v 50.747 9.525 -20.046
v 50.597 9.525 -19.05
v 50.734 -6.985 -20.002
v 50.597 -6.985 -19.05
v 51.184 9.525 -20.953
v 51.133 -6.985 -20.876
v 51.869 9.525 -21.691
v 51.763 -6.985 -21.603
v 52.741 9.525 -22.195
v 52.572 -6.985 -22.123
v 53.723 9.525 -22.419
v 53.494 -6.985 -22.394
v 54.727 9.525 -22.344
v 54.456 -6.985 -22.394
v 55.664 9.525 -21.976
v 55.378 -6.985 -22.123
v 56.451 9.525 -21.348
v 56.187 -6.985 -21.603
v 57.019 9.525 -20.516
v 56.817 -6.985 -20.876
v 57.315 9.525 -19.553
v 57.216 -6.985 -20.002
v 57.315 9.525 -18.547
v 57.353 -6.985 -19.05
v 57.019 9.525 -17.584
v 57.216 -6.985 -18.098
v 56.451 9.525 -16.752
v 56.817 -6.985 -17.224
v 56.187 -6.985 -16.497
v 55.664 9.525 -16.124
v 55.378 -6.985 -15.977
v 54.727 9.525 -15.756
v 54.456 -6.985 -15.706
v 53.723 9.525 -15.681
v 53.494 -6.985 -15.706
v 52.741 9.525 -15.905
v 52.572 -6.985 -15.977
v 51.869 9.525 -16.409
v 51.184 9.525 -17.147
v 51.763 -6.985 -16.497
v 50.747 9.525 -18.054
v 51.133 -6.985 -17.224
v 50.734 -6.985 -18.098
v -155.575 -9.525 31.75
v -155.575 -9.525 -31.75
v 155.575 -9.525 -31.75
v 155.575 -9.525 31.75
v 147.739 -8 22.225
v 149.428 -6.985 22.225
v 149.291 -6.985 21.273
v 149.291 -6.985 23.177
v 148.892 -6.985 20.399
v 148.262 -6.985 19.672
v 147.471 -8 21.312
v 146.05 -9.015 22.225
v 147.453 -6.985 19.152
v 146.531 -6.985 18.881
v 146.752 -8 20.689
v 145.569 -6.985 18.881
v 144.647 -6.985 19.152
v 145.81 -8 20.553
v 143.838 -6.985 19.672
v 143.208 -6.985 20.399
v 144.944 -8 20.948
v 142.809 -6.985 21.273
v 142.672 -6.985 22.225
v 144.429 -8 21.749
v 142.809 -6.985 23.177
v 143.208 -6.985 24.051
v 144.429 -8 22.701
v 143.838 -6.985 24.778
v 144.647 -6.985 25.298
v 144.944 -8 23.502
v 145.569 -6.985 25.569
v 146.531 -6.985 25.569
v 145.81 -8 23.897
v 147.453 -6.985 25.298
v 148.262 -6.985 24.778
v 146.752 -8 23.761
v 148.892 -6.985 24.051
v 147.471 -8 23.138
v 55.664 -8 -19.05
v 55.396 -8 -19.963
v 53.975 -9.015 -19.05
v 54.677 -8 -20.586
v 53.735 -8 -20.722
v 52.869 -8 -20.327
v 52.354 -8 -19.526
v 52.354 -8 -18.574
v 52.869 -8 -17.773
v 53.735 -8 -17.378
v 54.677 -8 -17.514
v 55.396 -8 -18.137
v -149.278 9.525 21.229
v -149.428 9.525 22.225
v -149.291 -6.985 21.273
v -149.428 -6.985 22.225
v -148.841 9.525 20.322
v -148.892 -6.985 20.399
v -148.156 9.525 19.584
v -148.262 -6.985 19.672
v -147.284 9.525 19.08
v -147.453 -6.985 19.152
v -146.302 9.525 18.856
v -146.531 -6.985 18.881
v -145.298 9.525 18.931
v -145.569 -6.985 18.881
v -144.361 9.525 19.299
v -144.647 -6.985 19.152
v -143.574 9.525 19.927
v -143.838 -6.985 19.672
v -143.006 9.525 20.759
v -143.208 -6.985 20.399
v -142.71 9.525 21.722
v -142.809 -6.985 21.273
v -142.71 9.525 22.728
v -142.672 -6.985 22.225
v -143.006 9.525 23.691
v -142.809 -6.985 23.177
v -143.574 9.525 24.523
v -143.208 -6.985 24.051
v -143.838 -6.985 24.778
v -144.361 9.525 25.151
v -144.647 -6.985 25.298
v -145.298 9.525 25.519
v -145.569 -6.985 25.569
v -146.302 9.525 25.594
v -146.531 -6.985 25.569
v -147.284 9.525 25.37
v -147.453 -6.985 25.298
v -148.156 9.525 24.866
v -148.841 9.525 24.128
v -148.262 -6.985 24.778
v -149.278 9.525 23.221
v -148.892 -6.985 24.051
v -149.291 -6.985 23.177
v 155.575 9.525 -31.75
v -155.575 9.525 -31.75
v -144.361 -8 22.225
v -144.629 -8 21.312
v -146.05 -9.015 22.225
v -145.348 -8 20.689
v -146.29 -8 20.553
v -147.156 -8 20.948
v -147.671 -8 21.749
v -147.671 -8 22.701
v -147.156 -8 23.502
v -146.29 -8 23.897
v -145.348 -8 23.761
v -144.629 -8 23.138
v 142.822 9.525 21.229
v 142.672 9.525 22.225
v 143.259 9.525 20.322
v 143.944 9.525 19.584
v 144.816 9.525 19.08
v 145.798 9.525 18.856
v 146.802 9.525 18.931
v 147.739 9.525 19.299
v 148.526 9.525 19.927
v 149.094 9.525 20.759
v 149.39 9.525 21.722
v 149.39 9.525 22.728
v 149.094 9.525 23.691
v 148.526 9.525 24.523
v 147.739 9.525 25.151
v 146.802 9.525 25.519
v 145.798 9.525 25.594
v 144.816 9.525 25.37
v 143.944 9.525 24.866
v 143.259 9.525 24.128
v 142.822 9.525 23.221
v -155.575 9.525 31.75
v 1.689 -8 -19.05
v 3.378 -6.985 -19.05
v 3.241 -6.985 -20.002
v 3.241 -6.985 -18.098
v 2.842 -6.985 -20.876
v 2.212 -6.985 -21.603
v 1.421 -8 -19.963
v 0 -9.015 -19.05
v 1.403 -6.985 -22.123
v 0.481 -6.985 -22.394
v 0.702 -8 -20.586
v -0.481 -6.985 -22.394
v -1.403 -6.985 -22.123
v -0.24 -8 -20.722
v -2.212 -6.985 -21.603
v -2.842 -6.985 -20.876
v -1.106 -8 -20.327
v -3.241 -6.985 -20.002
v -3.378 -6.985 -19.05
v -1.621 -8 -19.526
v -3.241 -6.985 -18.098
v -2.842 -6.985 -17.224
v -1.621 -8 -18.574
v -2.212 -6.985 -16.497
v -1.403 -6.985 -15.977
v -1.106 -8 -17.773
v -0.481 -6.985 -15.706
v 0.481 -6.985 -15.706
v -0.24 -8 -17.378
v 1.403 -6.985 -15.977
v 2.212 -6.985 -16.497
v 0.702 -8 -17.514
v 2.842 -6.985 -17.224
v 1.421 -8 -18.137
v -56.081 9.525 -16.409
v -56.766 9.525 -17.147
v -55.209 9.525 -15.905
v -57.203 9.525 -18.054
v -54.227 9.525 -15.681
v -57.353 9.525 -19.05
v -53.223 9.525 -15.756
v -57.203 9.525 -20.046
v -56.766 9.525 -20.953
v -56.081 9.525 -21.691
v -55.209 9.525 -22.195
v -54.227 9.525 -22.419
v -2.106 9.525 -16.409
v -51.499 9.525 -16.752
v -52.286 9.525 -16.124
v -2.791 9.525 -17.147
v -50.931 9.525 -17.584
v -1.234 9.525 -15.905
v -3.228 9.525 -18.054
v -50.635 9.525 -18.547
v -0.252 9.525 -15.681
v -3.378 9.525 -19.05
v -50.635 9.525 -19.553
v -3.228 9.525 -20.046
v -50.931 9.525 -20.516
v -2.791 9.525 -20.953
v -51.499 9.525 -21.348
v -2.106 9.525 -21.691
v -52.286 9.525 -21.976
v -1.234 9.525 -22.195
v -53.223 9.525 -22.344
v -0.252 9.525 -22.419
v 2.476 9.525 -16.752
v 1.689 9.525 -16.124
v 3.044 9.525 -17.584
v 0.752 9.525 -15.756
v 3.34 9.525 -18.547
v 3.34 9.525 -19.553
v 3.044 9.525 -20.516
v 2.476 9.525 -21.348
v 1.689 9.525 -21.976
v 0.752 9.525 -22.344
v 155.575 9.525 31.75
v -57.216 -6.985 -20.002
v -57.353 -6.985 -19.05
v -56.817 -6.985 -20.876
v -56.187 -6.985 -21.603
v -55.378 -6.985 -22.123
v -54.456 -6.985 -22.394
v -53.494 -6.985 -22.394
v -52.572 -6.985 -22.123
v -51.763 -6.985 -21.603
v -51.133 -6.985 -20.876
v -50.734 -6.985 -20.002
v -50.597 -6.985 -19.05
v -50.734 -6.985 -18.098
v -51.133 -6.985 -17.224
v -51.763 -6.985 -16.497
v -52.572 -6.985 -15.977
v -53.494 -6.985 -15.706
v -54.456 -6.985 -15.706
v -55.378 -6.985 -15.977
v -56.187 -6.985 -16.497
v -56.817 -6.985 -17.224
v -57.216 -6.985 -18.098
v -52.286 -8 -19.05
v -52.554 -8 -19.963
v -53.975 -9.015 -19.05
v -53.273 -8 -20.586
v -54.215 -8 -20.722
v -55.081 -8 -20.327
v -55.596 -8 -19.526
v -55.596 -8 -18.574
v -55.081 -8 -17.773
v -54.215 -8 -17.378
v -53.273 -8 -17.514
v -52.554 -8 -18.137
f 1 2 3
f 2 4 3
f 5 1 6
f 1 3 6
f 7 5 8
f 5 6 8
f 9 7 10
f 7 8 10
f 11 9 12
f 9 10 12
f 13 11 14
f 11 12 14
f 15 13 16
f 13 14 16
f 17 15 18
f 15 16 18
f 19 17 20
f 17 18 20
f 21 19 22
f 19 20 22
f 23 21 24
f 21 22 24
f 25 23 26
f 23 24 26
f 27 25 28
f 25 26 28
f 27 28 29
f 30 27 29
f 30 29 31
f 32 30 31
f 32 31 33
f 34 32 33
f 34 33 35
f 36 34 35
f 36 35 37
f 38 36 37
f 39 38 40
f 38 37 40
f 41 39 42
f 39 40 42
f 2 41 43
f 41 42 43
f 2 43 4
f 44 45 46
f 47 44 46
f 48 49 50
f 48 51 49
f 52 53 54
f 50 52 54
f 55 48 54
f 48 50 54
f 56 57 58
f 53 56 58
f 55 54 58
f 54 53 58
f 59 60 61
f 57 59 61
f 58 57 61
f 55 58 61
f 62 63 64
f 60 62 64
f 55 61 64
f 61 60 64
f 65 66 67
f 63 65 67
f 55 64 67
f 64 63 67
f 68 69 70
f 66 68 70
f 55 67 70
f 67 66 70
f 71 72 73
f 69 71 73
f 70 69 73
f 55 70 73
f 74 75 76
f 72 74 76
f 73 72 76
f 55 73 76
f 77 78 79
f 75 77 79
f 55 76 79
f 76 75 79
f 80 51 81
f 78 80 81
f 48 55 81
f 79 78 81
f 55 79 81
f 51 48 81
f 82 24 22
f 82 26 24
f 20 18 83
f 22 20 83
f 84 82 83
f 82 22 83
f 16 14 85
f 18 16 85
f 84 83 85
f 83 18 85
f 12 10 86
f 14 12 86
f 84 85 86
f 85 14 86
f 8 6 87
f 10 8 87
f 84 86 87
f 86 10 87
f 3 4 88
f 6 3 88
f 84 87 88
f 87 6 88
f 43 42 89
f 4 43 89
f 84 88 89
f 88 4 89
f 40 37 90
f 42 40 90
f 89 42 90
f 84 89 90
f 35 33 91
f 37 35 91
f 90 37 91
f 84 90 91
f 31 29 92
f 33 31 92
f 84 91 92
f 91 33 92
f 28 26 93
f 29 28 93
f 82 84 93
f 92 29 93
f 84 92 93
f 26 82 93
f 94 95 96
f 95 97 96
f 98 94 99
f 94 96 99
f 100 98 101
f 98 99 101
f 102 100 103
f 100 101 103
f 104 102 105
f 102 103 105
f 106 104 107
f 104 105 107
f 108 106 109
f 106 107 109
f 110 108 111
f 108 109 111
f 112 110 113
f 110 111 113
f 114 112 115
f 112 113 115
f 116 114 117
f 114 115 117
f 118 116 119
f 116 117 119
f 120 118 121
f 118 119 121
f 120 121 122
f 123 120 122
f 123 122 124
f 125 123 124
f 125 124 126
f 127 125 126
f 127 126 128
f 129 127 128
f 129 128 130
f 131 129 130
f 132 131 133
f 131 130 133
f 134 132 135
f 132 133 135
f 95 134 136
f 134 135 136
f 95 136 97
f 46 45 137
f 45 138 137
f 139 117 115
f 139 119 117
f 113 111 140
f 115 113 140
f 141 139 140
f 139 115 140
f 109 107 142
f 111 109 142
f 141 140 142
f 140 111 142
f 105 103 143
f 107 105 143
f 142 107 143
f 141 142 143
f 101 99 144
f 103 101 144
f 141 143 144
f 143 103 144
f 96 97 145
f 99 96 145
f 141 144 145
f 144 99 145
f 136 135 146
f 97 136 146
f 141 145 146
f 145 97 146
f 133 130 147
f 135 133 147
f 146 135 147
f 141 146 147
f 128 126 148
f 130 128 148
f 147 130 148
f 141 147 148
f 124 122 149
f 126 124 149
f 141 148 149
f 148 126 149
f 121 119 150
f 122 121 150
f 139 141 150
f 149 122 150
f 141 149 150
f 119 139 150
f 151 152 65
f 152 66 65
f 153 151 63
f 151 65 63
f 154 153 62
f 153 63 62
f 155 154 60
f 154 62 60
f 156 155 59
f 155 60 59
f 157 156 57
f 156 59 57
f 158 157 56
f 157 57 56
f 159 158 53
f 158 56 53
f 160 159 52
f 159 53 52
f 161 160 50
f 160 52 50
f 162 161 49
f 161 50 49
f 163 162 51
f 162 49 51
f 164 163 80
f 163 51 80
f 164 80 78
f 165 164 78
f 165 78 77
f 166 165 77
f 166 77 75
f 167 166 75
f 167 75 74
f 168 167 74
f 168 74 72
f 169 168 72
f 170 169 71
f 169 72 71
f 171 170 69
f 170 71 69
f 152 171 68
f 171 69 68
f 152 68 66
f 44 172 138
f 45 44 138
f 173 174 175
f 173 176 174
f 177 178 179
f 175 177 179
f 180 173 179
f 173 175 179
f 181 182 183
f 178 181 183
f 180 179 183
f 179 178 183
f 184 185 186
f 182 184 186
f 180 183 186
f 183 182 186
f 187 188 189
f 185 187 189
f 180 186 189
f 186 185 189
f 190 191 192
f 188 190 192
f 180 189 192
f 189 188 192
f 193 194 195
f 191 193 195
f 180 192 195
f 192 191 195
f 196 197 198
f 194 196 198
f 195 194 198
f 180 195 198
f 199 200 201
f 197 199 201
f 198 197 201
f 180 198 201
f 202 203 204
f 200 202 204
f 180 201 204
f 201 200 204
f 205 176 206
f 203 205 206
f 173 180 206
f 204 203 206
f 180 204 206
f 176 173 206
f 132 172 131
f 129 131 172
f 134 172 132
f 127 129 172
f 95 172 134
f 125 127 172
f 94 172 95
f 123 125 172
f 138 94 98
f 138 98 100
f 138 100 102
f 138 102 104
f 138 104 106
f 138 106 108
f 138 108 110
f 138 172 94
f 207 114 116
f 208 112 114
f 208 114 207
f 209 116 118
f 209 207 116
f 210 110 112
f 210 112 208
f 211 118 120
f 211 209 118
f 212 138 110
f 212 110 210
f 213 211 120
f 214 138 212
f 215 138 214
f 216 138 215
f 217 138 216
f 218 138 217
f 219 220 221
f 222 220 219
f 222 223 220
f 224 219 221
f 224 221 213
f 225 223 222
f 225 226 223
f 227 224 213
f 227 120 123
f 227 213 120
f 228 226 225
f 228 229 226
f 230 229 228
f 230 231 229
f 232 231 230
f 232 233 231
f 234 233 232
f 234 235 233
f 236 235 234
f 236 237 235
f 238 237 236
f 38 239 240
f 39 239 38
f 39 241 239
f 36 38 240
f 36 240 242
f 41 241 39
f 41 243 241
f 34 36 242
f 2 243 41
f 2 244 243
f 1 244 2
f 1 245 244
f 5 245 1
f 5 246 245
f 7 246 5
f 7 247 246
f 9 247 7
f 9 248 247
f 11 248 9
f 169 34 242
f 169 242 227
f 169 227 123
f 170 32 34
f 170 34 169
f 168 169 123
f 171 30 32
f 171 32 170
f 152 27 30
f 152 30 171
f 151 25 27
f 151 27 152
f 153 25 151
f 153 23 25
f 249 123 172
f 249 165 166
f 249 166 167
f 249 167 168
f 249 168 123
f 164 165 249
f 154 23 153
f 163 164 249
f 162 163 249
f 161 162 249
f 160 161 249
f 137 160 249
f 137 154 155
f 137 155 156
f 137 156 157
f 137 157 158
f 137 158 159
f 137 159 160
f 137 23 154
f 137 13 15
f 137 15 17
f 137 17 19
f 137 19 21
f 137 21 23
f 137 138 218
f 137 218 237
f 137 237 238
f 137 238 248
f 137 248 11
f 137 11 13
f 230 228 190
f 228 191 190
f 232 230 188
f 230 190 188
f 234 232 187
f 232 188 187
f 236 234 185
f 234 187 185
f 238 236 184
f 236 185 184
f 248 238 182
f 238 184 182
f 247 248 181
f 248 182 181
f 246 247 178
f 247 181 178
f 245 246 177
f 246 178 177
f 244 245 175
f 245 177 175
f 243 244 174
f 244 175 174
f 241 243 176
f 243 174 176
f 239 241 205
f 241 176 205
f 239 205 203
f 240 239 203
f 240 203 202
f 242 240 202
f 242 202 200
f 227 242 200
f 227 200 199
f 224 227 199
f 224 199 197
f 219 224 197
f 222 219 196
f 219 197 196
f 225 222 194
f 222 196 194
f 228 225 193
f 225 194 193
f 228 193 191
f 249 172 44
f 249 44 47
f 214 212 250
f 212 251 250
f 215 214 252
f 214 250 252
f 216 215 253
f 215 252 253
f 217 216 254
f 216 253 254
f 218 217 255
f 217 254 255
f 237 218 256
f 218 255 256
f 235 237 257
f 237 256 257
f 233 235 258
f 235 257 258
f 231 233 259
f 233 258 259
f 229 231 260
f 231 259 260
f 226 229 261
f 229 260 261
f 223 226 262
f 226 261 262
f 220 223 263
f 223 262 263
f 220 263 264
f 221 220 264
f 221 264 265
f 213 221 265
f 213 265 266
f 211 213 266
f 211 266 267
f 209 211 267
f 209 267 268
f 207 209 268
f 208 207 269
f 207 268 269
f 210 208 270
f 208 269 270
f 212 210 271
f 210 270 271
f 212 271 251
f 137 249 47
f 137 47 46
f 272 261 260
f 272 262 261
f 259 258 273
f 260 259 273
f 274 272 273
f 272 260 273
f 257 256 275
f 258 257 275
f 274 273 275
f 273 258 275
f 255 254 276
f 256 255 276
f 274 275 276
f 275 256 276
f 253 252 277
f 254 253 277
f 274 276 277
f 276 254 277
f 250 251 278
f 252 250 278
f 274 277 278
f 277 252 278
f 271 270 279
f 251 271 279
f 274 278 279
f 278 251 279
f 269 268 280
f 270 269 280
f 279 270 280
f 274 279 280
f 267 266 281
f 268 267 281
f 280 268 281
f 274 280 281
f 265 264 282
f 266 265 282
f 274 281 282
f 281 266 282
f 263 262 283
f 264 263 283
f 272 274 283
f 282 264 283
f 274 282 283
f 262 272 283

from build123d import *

# Parameters (mm, degrees)
SKETCH1_W                   = 311.15
SKETCH1_H                   = 63.5
BOSS_EXTRUDE1_DEPTH         = 9.525
F_1_4_CLEARANCE_HOLE1_D     = 6.7564
F_1_4_CLEARANCE_HOLE1_DEPTH = 16.51
F_1_4_CLEARANCE_HOLE1_TIP   = 2.029827343


with BuildPart() as part:
    # Sketch1 → Boss-Extrude1 (new, symmetric)
    with BuildSketch(Plane(origin=(0, 0, 0), x_dir=(1, 0, 0), z_dir=(0, 1, 0))):
        Rectangle(SKETCH1_W, SKETCH1_H)
    extrude(amount=BOSS_EXTRUDE1_DEPTH, both=True)

    # 1/4 Clearance Hole1
    with Locations(Plane(origin=(0, 9.525, 0), x_dir=(1, 0, 0), z_dir=(0, 1, 0))):
        with Locations((-53.975, 19.05), (0, 19.05), (53.975, 19.05), (146.05, -22.225), (-146.05, -22.225)):
            Hole(F_1_4_CLEARANCE_HOLE1_D / 2, depth=F_1_4_CLEARANCE_HOLE1_DEPTH)
            with Locations((0, 0, -(F_1_4_CLEARANCE_HOLE1_DEPTH + F_1_4_CLEARANCE_HOLE1_TIP / 2))):  # 118° drill point
                Cone(0, F_1_4_CLEARANCE_HOLE1_D / 2, F_1_4_CLEARANCE_HOLE1_TIP, mode=Mode.SUBTRACT)


solid = part.part
